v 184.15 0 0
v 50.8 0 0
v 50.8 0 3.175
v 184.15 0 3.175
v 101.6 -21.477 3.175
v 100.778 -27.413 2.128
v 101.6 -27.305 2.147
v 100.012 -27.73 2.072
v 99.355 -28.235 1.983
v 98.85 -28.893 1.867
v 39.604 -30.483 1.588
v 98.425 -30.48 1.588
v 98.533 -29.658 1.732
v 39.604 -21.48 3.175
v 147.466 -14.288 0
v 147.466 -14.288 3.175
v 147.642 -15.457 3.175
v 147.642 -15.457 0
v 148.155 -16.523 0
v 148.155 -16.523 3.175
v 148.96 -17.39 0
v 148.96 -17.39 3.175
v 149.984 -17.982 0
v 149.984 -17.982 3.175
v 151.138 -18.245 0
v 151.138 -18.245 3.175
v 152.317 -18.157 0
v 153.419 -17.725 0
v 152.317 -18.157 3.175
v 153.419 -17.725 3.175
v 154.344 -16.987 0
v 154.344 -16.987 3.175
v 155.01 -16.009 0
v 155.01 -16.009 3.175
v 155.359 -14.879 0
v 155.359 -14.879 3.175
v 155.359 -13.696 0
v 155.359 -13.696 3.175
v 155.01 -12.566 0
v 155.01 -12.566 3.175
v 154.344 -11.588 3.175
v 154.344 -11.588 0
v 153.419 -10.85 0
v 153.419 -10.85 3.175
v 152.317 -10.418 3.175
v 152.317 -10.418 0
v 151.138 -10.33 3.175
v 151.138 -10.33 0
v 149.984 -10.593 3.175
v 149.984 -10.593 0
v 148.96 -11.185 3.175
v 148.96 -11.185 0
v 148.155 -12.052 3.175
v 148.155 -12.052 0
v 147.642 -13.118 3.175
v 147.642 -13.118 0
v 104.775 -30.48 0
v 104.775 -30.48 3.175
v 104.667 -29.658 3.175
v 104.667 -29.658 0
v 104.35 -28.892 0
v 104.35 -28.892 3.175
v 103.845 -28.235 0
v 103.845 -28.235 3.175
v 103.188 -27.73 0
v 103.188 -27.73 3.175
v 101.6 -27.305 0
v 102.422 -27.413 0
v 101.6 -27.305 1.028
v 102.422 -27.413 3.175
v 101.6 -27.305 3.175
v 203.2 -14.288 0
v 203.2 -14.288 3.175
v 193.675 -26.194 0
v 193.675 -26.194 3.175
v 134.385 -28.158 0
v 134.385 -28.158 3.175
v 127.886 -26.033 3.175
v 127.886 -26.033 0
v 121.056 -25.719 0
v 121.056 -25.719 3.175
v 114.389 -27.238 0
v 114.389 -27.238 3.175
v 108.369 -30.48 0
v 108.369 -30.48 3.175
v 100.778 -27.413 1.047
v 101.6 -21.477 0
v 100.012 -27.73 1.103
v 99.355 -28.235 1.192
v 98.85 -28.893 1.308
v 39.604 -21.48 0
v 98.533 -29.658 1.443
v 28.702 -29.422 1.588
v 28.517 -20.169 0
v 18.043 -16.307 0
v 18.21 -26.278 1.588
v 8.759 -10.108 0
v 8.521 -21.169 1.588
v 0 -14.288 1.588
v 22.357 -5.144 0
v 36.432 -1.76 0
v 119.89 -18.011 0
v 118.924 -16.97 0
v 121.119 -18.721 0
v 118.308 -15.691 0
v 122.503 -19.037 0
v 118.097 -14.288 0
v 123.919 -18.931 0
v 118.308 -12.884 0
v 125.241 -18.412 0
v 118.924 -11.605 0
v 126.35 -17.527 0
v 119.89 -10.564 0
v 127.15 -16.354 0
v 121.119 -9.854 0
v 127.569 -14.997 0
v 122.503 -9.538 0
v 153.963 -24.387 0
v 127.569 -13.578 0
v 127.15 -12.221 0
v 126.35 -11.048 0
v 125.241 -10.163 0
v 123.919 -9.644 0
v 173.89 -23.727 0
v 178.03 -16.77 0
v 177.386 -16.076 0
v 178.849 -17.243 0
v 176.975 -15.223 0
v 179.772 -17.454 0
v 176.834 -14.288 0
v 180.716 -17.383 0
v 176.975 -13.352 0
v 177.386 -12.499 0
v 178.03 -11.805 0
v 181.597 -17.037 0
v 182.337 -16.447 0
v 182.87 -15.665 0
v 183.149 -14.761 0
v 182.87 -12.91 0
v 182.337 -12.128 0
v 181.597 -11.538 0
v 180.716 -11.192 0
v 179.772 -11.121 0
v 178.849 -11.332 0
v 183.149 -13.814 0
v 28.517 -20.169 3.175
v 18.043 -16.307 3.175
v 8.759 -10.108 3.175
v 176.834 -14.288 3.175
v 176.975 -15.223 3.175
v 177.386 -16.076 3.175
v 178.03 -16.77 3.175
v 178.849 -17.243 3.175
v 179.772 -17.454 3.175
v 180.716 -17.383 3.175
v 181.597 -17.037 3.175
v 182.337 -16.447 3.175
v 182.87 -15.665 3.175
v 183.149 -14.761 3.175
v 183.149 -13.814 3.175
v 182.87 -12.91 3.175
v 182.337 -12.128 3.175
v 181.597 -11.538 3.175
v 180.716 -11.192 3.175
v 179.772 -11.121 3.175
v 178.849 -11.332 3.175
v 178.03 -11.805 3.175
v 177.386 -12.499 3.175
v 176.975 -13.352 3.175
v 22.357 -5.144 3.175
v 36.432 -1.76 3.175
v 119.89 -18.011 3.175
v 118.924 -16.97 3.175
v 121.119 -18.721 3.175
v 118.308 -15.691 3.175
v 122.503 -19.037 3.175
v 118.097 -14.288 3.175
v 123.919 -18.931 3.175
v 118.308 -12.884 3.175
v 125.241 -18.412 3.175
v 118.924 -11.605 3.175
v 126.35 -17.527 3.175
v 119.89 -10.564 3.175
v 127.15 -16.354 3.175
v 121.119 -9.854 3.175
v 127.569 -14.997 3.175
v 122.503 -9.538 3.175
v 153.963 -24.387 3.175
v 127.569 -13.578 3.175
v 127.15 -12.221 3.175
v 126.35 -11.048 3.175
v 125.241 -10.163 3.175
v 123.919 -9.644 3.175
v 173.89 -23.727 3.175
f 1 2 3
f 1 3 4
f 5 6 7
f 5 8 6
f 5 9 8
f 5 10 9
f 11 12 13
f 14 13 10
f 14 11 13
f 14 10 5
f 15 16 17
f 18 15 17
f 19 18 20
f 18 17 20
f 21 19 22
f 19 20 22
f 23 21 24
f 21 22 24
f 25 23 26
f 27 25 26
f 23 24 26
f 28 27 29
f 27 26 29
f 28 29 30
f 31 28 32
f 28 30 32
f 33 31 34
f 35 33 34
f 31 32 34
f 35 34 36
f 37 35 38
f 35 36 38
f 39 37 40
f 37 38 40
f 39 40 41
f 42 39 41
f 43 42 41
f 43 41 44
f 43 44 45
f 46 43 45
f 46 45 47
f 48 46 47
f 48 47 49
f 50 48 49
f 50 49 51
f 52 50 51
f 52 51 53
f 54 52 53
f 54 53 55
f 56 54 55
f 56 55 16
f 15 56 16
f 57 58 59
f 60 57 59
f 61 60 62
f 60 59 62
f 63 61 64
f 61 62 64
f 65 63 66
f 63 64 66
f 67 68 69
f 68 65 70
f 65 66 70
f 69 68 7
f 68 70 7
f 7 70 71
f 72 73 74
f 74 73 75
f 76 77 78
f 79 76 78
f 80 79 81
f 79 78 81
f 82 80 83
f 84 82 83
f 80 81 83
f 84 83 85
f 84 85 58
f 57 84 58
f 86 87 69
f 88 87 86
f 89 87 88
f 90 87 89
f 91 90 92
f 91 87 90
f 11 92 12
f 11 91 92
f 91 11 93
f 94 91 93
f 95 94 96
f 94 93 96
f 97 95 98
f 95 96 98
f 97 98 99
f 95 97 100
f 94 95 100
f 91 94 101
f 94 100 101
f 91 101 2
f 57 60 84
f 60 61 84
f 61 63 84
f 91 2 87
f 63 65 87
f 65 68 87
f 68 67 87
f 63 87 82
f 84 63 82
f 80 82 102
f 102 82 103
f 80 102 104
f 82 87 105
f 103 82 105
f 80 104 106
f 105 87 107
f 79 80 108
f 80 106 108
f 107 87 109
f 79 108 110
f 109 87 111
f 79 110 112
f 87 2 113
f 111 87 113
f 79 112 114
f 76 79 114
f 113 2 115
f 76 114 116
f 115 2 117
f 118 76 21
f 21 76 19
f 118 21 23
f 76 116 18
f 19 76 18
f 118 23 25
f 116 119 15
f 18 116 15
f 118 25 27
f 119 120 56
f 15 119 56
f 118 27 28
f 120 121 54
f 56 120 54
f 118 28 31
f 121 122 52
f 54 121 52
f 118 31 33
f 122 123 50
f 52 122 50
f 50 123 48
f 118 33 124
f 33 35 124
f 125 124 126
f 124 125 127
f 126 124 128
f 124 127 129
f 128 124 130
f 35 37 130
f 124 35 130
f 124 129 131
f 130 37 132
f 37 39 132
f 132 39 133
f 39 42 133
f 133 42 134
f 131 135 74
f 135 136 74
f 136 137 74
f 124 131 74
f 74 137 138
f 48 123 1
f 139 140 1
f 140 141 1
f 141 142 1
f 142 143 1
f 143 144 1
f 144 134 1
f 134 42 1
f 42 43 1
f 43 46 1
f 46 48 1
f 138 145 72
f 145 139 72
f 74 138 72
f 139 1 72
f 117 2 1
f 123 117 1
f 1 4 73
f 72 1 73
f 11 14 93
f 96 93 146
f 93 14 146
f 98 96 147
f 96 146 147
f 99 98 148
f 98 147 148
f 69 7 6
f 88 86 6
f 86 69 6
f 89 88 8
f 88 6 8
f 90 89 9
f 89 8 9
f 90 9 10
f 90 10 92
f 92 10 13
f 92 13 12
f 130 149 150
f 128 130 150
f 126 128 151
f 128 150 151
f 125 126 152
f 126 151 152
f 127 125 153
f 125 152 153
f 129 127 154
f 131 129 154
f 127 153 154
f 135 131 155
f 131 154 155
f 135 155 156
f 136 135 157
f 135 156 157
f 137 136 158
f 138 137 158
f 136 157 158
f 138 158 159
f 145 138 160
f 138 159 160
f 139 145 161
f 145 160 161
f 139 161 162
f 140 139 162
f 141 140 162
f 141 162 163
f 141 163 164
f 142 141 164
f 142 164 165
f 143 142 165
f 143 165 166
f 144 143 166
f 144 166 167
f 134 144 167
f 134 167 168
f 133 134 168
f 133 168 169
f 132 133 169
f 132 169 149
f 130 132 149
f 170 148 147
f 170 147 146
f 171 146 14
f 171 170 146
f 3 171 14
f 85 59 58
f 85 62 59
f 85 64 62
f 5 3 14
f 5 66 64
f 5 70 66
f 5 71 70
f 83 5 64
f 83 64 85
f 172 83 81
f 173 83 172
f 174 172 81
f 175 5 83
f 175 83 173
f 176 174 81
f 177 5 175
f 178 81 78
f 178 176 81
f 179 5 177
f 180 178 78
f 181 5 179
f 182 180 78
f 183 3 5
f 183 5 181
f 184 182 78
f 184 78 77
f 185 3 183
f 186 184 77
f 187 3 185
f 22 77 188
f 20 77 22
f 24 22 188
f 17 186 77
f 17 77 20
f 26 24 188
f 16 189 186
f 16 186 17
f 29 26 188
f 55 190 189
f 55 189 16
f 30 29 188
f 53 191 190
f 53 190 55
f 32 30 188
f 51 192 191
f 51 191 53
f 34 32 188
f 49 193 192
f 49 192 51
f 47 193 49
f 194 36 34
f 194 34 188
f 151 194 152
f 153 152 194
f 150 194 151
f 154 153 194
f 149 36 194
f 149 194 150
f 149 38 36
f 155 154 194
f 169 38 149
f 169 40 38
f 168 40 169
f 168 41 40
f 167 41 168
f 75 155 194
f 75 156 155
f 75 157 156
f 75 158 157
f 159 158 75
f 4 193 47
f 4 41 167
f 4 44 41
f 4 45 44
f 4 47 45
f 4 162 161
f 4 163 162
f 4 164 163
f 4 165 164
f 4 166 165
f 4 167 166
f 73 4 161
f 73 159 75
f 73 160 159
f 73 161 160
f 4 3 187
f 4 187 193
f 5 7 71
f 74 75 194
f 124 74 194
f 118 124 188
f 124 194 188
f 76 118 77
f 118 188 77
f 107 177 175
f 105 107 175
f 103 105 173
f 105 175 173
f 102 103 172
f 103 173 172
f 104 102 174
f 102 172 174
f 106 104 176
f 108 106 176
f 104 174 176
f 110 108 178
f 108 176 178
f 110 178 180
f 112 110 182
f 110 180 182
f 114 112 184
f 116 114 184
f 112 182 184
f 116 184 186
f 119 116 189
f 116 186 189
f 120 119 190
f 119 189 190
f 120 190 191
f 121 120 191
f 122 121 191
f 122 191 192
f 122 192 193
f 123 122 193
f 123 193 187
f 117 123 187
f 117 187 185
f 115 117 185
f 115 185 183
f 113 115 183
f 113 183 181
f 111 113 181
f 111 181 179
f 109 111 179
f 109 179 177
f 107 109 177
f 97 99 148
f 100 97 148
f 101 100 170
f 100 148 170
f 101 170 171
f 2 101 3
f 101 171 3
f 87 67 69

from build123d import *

# Parameters (mm, degrees)
F0_W     = 203.2
F0_H     = 38.1
F1_DEPTH = 3.175
F2_W     = 3.175
F2_H     = 4.445
F3_DEPTH = 25.4


# Not quite as in the source:
# - a feature names something its author has since deleted; it is built from what else it names


with BuildPart() as f1:
    # F0 (on Top) → F1 (new body)
    with BuildSketch(Plane.XY):
        with Locations((101.6, -19.05)):
            Rectangle(F0_W, F0_H)
    extrude(amount=F1_DEPTH)

    # F2 (on face) → F3 (cut)
    with BuildSketch(Plane.XY.offset(3.175)):
        with BuildLine():
            Line((0, -9.525), (0, -14.2875))
            ThreePointArc((0, -14.2875), (24.649723028, -4.4760985439), (50.8, 0))
            Line((50.8, 0), (0, 0))
            Line((0, 0), (0, -9.525))
        make_face()
        with Locations((103.1875, -35.8775)):
            Rectangle(F2_W, F2_H)
        with BuildLine():
            ThreePointArc((104.775, -30.48), (103.8450640303, -32.7250640303), (101.6, -33.655))
            Line((101.6, -33.655), (104.775, -33.655))
            Line((104.775, -33.655), (104.775, -30.48))
        make_face()
        with BuildLine():
            Line((104.775, -30.48), (101.6, -30.48))
            Line((101.6, -30.48), (101.6, -33.655))
            ThreePointArc((101.6, -33.655), (103.8450640303, -32.7250640303), (104.775, -30.48))
        make_face()
        with BuildLine():
            Line((101.6, -27.305), (101.6, -30.48))
            Line((101.6, -30.48), (104.775, -30.48))
            ThreePointArc((104.775, -30.48), (103.8450640303, -28.2349359697), (101.6, -27.305))
        make_face()
        with BuildLine():
            Line((98.4250000029, -30.4801362911), (101.6, -30.48))
            Line((101.6, -30.48), (101.6, -27.305))
            ThreePointArc((101.6, -27.305), (99.3548877841, -28.2349841564), (98.4250000029, -30.4801362911))
        make_face()
        with BuildLine():
            Line((101.6, -33.655), (101.6, -30.48))
            Line((101.6, -30.48), (98.4250000029, -30.4801362911))
            ThreePointArc((98.4250000029, -30.4801362911), (99.3549841564, -32.7251122159), (101.6, -33.655))
        make_face()
        with BuildLine():
            ThreePointArc((108.3690122037, -30.48), (106.4969075417, -31.9824905065), (104.775, -33.655))
            Line((104.775, -33.655), (104.775, -38.1))
            Line((104.775, -38.1), (184.15, -38.1))
            Line((184.15, -38.1), (193.675, -26.19375))
            ThreePointArc((193.675, -26.19375), (163.9135585822, -23.6655567526), (134.3847364187, -28.1581971794))
            ThreePointArc((134.3847364187, -28.1581971794), (121.0555708247, -25.7189035938), (108.3690122037, -30.48))
        make_face()
        with BuildLine():
            Line((101.6, -38.1), (101.6, -33.655))
            ThreePointArc((101.6, -33.655), (99.3549841564, -32.7251122159), (98.4250000029, -30.4801362911))
            Line((98.4250000029, -30.4801362911), (39.6036359929, -30.4826612755))
            ThreePointArc((39.6036359929, -30.4826612755), (18.2099329026, -26.2778753266), (0, -14.2875))
            Line((0, -14.2875), (0, -19.05))
            Line((0, -19.05), (0, -38.1))
            Line((0, -38.1), (101.6, -38.1))
        make_face()
        Polygon((203.2, 0), (184.15, 0), (203.2, -14.2875), align=None)
        Polygon((193.675, -26.19375), (184.15, -38.1), (203.2, -38.1), (203.2, -19.05), (203.2, -14.2875), align=None)
        with BuildLine():
            Line((108.3690122037, -30.48), (104.775, -30.48))
            Line((104.775, -30.48), (104.775, -33.655))
            ThreePointArc((104.775, -33.655), (106.4969075417, -31.9824905065), (108.3690122037, -30.48))
        make_face()
        with BuildLine():
            ThreePointArc((127.6218066335, -14.2875), (122.8593066335, -9.525), (118.0968066335, -14.2875))
            Line((118.0968066335, -14.2875), (127.6218066335, -14.2875))
        make_face()
        with BuildLine():
            Line((127.6218066335, -14.2875), (118.0968066335, -14.2875))
            ThreePointArc((118.0968066335, -14.2875), (122.8593066335, -19.05), (127.6218066335, -14.2875))
        make_face()
        with BuildLine():
            Line((176.8343066335, -14.2875), (183.1843066335, -14.2875))
            ThreePointArc((183.1843066335, -14.2875), (180.0093066335, -11.1125), (176.8343066335, -14.2875))
        make_face()
        with BuildLine():
            ThreePointArc((176.8343066335, -14.2875), (180.0093066335, -17.4625), (183.1843066335, -14.2875))
            Line((183.1843066335, -14.2875), (176.8343066335, -14.2875))
        make_face()
        with BuildLine():
            ThreePointArc((155.4030566335, -14.2875), (151.4343066335, -10.31875), (147.4655566335, -14.2875))
            Line((147.4655566335, -14.2875), (155.4030566335, -14.2875))
        make_face()
        with BuildLine():
            Line((155.4030566335, -14.2875), (147.4655566335, -14.2875))
            ThreePointArc((147.4655566335, -14.2875), (151.4343066335, -18.25625), (155.4030566335, -14.2875))
        make_face()
    extrude(amount=-F3_DEPTH, mode=Mode.SUBTRACT)

    # F8: sweep along a path in F5
    with BuildLine(Plane.XY.offset(1.5875)) as f8_path:
        Line((101.6, -30.48), (39.6036359929, -30.4826612755))
        ThreePointArc((39.6036359929, -30.4826612755), (18.2099329026, -26.2778753266), (0, -14.2875))
    # F7 (on offset) → F8 (sweep, cut)
    with BuildSketch(Plane.YZ.offset(101.6)):
        Polygon((-30.48, 3.1877), (-30.48, 1.5875), (-4.1187478461, 6.2357), (-30.48, 6.2357), align=None)
        Polygon((-30.48, 1.5875), (-30.48, 0), (-30.48, -3.0607), (-4.1187478461, -3.0607), align=None)
    sweep(path=f8_path.line, mode=Mode.SUBTRACT)


solid = f1.part
